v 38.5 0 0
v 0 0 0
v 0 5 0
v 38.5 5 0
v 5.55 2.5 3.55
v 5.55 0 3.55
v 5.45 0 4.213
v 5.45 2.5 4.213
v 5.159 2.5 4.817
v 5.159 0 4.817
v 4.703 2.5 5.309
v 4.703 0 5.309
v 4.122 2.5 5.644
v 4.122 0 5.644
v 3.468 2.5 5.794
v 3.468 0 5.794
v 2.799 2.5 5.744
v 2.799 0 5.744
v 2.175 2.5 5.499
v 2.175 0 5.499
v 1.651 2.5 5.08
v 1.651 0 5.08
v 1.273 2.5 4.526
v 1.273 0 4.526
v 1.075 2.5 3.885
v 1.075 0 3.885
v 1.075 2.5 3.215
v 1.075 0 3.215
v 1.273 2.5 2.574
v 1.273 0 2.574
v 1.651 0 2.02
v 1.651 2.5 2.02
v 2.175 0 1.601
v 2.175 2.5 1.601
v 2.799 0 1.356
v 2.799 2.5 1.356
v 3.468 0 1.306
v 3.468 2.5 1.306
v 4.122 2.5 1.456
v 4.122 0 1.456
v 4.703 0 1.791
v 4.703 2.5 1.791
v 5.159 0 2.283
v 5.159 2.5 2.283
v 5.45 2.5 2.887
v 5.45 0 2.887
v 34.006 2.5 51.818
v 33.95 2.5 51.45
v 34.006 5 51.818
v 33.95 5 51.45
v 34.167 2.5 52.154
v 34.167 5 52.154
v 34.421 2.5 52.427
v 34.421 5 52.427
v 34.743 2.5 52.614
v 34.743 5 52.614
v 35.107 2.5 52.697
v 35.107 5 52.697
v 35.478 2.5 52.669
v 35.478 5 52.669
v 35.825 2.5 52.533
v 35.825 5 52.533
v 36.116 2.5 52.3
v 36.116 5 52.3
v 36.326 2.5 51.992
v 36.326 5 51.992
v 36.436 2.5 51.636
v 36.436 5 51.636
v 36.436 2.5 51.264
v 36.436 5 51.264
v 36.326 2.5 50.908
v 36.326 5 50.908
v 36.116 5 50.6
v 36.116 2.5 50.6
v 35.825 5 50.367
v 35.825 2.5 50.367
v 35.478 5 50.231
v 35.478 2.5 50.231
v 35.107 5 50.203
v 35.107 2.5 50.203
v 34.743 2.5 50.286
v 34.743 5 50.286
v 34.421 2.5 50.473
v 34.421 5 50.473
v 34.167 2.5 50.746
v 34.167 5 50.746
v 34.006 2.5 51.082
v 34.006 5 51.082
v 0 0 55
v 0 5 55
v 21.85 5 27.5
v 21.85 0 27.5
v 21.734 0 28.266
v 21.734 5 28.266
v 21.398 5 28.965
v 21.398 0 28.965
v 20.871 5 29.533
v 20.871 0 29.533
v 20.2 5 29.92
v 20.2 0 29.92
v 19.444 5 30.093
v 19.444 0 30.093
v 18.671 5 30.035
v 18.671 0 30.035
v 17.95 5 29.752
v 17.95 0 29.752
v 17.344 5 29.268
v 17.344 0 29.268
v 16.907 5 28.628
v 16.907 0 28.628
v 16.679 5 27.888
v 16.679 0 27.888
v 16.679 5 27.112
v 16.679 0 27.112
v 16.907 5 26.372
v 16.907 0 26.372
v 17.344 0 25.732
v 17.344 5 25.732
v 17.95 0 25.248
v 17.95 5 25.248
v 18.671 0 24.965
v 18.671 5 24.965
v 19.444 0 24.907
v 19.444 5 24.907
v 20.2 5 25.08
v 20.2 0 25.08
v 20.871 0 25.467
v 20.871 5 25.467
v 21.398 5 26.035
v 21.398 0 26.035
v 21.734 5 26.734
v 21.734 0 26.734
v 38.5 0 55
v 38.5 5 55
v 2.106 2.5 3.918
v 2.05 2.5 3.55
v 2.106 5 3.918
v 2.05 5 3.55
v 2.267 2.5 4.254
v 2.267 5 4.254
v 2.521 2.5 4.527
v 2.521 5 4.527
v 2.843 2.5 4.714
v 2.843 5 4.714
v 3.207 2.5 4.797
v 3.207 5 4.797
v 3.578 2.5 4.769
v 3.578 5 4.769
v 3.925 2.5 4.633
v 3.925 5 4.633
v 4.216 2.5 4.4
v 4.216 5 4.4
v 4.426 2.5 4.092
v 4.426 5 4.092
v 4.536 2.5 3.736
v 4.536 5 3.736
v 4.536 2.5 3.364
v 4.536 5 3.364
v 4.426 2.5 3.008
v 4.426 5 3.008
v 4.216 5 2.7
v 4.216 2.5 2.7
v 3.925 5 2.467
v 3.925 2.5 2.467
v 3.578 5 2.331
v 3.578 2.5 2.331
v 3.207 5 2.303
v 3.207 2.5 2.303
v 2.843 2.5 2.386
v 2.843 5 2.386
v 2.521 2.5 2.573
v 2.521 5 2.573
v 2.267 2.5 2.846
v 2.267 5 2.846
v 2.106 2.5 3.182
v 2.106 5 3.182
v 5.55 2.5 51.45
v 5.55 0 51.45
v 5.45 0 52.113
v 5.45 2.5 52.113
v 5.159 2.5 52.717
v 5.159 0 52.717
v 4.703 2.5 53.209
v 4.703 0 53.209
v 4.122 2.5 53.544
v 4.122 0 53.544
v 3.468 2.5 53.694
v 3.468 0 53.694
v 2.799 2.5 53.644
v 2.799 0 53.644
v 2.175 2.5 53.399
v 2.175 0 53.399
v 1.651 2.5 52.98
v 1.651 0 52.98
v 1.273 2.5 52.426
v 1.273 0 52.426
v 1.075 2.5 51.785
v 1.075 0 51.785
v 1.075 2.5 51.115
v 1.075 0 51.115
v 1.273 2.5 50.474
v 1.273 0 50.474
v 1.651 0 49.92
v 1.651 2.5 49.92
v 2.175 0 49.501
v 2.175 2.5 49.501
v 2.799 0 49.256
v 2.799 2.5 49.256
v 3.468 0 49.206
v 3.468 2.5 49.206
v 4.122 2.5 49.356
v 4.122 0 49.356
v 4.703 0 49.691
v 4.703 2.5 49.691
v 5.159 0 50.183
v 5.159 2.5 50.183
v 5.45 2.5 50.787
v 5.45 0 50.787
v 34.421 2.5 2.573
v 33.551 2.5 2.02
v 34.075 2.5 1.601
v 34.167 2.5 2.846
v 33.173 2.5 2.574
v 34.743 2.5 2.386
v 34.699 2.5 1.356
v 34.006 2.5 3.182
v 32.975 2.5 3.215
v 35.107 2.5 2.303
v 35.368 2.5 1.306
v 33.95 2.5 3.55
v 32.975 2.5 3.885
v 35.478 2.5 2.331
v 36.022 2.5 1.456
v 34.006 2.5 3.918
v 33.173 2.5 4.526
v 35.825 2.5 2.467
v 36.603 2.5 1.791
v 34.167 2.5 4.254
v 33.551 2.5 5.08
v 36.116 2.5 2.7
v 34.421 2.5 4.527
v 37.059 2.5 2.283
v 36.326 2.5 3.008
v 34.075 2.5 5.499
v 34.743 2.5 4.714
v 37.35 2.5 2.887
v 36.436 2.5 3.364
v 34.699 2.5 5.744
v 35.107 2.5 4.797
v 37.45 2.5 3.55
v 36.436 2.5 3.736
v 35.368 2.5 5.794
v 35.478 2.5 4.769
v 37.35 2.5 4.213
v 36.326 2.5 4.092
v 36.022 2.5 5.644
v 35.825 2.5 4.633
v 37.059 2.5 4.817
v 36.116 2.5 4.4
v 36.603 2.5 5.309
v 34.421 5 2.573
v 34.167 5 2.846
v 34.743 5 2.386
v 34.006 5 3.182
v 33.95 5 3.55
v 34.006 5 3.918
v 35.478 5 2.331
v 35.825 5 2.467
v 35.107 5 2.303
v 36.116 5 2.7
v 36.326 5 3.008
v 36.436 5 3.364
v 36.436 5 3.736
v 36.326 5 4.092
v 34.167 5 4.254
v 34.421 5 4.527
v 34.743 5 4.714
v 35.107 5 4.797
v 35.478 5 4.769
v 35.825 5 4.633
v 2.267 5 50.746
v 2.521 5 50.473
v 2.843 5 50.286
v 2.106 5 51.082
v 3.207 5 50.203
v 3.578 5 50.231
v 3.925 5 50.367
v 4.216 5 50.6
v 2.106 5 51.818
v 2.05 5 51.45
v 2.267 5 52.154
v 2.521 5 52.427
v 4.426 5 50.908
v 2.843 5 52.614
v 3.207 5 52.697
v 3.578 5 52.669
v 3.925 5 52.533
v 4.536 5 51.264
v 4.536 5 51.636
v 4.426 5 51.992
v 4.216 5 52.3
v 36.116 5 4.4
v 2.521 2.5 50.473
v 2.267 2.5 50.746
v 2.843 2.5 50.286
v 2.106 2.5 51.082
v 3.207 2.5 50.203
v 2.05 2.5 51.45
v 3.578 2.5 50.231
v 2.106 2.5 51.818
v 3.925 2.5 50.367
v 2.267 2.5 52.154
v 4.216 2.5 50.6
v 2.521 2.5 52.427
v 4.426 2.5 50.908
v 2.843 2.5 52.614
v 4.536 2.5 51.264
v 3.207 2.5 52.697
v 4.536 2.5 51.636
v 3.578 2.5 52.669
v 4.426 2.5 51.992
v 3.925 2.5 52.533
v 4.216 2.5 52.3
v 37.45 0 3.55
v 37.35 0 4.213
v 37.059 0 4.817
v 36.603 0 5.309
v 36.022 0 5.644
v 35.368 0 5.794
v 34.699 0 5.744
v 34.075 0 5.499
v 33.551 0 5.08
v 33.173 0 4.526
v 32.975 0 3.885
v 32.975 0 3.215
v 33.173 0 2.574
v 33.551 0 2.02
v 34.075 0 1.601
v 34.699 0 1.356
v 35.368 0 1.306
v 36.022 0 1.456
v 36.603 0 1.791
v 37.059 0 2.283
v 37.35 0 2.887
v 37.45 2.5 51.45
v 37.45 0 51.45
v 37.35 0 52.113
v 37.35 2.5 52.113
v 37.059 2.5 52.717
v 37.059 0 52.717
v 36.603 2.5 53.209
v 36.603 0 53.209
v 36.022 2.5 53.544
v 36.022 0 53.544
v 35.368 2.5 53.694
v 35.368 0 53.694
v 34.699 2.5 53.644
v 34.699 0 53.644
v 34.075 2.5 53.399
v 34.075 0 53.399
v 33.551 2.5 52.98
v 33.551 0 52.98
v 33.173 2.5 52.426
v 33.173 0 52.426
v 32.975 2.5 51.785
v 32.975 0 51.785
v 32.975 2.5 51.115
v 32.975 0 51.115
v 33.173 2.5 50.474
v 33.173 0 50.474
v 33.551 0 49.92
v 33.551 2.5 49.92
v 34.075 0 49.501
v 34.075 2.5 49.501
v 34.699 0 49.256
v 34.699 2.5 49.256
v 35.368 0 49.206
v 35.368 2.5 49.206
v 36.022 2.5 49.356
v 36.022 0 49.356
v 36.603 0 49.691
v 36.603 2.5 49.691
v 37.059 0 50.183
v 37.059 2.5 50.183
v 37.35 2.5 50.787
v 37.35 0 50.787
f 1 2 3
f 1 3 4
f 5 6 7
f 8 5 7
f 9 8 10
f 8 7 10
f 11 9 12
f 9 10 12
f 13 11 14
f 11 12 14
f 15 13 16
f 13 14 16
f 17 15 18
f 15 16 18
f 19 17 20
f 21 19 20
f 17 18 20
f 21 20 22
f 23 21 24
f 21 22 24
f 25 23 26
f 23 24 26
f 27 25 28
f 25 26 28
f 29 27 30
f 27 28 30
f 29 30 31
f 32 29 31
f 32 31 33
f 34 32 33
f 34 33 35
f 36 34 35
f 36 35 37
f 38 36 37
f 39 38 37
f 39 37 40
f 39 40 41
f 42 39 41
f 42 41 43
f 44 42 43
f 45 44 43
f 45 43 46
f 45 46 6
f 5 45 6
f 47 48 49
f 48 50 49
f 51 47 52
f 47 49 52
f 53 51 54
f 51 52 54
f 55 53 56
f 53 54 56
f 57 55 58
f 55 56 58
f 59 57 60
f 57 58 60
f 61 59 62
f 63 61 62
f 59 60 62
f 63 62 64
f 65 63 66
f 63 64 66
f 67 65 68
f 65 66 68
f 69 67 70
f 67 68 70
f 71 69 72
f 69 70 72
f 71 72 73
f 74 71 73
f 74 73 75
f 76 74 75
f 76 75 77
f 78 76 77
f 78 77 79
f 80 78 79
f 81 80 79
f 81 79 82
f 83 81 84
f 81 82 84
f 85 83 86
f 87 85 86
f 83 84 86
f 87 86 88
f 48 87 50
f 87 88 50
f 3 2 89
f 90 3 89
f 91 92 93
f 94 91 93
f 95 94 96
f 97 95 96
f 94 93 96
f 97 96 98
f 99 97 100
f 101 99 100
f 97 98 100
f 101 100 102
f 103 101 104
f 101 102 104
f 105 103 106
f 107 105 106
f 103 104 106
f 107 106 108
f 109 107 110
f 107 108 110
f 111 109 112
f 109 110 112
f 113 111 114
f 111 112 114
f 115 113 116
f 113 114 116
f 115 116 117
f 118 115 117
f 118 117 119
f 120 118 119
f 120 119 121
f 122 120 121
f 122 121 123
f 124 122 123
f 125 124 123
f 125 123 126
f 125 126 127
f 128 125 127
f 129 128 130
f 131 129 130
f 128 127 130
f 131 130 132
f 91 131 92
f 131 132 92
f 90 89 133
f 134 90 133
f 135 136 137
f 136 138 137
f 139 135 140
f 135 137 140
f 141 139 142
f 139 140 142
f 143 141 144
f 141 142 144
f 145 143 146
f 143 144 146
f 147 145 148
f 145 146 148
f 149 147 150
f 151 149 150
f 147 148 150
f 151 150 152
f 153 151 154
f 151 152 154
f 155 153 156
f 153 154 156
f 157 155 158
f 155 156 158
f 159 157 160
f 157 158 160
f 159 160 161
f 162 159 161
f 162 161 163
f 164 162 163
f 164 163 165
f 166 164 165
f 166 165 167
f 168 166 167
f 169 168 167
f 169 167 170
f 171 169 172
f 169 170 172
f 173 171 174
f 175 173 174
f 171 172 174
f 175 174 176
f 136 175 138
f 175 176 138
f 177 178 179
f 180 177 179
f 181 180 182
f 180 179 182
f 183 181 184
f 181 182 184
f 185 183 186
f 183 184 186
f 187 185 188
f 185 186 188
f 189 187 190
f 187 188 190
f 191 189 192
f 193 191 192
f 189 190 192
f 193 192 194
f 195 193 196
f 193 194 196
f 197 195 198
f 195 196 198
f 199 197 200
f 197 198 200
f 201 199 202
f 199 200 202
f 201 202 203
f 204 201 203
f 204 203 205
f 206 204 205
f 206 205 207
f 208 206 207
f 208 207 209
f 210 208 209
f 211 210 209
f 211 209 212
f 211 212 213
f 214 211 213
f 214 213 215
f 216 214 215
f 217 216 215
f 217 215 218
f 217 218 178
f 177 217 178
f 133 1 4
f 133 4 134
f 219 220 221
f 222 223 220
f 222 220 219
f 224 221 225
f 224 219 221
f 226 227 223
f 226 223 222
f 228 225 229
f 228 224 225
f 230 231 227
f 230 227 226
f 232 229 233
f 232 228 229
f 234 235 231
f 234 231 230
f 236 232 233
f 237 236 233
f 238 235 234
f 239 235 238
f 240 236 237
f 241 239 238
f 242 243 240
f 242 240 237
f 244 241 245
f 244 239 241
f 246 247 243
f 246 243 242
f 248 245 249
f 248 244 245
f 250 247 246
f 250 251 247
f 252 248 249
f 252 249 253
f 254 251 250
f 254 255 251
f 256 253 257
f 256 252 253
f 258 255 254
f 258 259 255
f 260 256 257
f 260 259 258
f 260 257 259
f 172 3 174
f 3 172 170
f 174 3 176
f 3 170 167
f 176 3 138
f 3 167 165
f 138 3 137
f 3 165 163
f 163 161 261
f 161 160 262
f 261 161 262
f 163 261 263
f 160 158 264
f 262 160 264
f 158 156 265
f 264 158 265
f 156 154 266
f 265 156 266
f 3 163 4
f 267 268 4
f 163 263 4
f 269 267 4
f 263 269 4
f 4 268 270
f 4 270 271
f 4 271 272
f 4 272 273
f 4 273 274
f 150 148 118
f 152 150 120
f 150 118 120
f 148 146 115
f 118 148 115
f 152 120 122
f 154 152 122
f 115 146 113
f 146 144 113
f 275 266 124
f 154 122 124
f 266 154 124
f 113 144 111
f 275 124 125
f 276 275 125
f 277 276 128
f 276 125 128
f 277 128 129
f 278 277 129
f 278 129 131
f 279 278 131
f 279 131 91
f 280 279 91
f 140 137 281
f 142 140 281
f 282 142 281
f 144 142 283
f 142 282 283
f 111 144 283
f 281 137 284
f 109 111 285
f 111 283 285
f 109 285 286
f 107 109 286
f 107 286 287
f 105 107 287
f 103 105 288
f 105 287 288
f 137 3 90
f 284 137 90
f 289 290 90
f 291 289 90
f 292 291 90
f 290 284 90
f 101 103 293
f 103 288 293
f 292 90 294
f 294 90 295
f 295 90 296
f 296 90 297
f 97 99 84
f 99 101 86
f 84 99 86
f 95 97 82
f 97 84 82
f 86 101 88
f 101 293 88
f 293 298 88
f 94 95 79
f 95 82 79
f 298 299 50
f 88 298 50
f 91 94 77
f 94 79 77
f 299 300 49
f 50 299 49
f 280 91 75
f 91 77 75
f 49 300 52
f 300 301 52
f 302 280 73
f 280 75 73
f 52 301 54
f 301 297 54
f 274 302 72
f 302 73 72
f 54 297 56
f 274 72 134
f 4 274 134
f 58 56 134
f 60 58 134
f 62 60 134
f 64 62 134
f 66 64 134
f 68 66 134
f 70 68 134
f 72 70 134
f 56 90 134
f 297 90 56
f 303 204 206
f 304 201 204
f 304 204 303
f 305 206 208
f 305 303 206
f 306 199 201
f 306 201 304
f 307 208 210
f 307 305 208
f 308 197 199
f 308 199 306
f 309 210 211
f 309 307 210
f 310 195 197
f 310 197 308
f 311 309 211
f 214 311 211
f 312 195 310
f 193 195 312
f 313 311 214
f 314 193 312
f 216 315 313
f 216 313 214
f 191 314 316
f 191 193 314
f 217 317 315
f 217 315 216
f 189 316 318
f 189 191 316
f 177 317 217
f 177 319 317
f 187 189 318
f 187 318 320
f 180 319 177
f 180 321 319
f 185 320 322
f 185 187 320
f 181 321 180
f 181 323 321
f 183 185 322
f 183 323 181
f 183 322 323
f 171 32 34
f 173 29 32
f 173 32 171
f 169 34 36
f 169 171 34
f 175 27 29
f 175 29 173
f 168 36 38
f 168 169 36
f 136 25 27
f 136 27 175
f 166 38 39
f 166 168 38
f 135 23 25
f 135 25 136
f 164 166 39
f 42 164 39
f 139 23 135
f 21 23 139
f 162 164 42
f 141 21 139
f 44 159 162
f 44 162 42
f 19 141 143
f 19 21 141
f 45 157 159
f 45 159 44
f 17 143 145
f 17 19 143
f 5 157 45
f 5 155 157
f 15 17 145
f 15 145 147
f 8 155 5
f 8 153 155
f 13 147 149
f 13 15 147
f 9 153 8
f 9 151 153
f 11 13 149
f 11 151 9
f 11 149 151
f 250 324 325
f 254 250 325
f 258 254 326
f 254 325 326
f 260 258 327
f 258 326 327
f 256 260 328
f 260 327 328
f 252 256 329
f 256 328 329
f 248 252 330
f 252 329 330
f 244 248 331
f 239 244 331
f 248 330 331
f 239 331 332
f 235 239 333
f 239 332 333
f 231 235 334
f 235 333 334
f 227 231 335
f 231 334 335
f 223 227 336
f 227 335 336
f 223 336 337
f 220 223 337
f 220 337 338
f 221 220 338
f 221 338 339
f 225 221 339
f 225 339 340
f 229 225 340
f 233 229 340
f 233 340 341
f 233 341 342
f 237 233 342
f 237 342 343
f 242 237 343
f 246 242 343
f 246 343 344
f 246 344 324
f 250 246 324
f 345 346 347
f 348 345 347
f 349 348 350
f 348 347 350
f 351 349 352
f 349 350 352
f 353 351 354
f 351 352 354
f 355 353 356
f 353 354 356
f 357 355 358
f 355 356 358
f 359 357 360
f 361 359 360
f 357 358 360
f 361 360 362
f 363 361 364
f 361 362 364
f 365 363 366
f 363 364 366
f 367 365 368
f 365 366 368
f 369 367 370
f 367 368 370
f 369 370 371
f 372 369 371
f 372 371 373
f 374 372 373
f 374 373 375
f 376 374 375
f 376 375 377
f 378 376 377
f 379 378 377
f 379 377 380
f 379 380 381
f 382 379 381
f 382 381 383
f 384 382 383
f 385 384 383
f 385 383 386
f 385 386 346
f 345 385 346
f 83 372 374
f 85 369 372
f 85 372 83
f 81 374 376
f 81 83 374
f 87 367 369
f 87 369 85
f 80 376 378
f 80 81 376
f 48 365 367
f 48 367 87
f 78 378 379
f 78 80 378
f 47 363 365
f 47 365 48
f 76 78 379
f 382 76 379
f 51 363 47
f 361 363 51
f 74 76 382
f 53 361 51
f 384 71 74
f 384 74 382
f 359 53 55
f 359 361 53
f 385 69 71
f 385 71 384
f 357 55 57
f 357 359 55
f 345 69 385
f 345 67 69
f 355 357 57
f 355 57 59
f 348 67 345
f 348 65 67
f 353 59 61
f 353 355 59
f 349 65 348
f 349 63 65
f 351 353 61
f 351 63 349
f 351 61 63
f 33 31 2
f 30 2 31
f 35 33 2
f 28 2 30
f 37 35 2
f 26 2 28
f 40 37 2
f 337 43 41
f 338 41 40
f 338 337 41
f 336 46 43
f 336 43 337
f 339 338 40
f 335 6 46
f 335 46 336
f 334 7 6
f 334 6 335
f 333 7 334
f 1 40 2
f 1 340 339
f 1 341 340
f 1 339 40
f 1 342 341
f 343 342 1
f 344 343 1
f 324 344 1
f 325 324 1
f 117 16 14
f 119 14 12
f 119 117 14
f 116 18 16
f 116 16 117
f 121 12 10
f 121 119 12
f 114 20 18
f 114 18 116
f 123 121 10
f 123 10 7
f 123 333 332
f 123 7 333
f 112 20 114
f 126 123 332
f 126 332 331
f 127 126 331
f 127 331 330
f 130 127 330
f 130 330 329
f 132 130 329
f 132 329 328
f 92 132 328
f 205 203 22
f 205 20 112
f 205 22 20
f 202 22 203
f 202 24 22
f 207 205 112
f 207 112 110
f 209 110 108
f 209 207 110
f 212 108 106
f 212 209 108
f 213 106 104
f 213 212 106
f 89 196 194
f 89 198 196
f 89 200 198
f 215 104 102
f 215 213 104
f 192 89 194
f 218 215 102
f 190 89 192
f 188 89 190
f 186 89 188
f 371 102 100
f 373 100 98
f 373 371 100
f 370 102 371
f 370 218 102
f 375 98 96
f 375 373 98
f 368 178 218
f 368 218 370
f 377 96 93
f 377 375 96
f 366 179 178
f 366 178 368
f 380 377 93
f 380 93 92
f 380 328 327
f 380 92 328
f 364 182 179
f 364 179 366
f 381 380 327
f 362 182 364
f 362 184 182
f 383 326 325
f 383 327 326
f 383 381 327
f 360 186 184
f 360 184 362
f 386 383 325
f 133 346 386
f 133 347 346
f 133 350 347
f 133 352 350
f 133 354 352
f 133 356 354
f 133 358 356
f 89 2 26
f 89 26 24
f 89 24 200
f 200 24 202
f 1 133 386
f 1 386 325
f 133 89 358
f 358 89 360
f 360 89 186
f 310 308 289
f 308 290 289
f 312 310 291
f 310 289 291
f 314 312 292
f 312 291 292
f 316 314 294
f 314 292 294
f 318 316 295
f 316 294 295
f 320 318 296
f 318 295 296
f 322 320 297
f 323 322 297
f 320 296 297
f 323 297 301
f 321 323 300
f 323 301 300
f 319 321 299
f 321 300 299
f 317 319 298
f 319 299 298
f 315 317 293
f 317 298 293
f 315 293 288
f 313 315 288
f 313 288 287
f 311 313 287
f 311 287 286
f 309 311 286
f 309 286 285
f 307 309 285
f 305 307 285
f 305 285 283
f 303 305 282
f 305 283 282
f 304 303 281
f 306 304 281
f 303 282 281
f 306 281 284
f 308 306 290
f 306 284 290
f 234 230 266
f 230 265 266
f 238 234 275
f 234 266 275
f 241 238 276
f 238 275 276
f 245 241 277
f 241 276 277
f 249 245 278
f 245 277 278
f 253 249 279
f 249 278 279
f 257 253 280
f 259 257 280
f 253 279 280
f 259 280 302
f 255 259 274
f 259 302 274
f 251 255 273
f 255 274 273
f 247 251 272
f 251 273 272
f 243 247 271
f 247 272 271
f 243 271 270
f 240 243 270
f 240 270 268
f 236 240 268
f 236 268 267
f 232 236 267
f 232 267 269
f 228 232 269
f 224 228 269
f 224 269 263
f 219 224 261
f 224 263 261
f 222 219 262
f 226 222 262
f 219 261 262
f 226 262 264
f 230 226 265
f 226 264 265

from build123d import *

# Parameters (mm, degrees)
F0_W           = 38.5
F0_H           = 55
F0_R           = 2.6
F1_DEPTH       = 5
F2_D           = 2.5
F2_CBORE_D     = 4.5
F2_CBORE_DEPTH = 2.5


with BuildPart() as f1:
    # F0 (on Front) → F1 (new body)
    with BuildSketch(Plane.XZ):
        with Locations((19.25, 27.5)):
            Rectangle(F0_W, F0_H)
        with Locations((19.25, 27.5)):
            Circle(F0_R, mode=Mode.SUBTRACT)
    extrude(amount=-F1_DEPTH)

    # F2 (through all)
    with Locations(Plane.XZ):
        with Locations((3.3, 3.55), (35.2, 3.55), (35.2, 51.45), (3.3, 51.45)):
            CounterBoreHole(F2_D / 2, F2_CBORE_D / 2, F2_CBORE_DEPTH)


solid = f1.part
